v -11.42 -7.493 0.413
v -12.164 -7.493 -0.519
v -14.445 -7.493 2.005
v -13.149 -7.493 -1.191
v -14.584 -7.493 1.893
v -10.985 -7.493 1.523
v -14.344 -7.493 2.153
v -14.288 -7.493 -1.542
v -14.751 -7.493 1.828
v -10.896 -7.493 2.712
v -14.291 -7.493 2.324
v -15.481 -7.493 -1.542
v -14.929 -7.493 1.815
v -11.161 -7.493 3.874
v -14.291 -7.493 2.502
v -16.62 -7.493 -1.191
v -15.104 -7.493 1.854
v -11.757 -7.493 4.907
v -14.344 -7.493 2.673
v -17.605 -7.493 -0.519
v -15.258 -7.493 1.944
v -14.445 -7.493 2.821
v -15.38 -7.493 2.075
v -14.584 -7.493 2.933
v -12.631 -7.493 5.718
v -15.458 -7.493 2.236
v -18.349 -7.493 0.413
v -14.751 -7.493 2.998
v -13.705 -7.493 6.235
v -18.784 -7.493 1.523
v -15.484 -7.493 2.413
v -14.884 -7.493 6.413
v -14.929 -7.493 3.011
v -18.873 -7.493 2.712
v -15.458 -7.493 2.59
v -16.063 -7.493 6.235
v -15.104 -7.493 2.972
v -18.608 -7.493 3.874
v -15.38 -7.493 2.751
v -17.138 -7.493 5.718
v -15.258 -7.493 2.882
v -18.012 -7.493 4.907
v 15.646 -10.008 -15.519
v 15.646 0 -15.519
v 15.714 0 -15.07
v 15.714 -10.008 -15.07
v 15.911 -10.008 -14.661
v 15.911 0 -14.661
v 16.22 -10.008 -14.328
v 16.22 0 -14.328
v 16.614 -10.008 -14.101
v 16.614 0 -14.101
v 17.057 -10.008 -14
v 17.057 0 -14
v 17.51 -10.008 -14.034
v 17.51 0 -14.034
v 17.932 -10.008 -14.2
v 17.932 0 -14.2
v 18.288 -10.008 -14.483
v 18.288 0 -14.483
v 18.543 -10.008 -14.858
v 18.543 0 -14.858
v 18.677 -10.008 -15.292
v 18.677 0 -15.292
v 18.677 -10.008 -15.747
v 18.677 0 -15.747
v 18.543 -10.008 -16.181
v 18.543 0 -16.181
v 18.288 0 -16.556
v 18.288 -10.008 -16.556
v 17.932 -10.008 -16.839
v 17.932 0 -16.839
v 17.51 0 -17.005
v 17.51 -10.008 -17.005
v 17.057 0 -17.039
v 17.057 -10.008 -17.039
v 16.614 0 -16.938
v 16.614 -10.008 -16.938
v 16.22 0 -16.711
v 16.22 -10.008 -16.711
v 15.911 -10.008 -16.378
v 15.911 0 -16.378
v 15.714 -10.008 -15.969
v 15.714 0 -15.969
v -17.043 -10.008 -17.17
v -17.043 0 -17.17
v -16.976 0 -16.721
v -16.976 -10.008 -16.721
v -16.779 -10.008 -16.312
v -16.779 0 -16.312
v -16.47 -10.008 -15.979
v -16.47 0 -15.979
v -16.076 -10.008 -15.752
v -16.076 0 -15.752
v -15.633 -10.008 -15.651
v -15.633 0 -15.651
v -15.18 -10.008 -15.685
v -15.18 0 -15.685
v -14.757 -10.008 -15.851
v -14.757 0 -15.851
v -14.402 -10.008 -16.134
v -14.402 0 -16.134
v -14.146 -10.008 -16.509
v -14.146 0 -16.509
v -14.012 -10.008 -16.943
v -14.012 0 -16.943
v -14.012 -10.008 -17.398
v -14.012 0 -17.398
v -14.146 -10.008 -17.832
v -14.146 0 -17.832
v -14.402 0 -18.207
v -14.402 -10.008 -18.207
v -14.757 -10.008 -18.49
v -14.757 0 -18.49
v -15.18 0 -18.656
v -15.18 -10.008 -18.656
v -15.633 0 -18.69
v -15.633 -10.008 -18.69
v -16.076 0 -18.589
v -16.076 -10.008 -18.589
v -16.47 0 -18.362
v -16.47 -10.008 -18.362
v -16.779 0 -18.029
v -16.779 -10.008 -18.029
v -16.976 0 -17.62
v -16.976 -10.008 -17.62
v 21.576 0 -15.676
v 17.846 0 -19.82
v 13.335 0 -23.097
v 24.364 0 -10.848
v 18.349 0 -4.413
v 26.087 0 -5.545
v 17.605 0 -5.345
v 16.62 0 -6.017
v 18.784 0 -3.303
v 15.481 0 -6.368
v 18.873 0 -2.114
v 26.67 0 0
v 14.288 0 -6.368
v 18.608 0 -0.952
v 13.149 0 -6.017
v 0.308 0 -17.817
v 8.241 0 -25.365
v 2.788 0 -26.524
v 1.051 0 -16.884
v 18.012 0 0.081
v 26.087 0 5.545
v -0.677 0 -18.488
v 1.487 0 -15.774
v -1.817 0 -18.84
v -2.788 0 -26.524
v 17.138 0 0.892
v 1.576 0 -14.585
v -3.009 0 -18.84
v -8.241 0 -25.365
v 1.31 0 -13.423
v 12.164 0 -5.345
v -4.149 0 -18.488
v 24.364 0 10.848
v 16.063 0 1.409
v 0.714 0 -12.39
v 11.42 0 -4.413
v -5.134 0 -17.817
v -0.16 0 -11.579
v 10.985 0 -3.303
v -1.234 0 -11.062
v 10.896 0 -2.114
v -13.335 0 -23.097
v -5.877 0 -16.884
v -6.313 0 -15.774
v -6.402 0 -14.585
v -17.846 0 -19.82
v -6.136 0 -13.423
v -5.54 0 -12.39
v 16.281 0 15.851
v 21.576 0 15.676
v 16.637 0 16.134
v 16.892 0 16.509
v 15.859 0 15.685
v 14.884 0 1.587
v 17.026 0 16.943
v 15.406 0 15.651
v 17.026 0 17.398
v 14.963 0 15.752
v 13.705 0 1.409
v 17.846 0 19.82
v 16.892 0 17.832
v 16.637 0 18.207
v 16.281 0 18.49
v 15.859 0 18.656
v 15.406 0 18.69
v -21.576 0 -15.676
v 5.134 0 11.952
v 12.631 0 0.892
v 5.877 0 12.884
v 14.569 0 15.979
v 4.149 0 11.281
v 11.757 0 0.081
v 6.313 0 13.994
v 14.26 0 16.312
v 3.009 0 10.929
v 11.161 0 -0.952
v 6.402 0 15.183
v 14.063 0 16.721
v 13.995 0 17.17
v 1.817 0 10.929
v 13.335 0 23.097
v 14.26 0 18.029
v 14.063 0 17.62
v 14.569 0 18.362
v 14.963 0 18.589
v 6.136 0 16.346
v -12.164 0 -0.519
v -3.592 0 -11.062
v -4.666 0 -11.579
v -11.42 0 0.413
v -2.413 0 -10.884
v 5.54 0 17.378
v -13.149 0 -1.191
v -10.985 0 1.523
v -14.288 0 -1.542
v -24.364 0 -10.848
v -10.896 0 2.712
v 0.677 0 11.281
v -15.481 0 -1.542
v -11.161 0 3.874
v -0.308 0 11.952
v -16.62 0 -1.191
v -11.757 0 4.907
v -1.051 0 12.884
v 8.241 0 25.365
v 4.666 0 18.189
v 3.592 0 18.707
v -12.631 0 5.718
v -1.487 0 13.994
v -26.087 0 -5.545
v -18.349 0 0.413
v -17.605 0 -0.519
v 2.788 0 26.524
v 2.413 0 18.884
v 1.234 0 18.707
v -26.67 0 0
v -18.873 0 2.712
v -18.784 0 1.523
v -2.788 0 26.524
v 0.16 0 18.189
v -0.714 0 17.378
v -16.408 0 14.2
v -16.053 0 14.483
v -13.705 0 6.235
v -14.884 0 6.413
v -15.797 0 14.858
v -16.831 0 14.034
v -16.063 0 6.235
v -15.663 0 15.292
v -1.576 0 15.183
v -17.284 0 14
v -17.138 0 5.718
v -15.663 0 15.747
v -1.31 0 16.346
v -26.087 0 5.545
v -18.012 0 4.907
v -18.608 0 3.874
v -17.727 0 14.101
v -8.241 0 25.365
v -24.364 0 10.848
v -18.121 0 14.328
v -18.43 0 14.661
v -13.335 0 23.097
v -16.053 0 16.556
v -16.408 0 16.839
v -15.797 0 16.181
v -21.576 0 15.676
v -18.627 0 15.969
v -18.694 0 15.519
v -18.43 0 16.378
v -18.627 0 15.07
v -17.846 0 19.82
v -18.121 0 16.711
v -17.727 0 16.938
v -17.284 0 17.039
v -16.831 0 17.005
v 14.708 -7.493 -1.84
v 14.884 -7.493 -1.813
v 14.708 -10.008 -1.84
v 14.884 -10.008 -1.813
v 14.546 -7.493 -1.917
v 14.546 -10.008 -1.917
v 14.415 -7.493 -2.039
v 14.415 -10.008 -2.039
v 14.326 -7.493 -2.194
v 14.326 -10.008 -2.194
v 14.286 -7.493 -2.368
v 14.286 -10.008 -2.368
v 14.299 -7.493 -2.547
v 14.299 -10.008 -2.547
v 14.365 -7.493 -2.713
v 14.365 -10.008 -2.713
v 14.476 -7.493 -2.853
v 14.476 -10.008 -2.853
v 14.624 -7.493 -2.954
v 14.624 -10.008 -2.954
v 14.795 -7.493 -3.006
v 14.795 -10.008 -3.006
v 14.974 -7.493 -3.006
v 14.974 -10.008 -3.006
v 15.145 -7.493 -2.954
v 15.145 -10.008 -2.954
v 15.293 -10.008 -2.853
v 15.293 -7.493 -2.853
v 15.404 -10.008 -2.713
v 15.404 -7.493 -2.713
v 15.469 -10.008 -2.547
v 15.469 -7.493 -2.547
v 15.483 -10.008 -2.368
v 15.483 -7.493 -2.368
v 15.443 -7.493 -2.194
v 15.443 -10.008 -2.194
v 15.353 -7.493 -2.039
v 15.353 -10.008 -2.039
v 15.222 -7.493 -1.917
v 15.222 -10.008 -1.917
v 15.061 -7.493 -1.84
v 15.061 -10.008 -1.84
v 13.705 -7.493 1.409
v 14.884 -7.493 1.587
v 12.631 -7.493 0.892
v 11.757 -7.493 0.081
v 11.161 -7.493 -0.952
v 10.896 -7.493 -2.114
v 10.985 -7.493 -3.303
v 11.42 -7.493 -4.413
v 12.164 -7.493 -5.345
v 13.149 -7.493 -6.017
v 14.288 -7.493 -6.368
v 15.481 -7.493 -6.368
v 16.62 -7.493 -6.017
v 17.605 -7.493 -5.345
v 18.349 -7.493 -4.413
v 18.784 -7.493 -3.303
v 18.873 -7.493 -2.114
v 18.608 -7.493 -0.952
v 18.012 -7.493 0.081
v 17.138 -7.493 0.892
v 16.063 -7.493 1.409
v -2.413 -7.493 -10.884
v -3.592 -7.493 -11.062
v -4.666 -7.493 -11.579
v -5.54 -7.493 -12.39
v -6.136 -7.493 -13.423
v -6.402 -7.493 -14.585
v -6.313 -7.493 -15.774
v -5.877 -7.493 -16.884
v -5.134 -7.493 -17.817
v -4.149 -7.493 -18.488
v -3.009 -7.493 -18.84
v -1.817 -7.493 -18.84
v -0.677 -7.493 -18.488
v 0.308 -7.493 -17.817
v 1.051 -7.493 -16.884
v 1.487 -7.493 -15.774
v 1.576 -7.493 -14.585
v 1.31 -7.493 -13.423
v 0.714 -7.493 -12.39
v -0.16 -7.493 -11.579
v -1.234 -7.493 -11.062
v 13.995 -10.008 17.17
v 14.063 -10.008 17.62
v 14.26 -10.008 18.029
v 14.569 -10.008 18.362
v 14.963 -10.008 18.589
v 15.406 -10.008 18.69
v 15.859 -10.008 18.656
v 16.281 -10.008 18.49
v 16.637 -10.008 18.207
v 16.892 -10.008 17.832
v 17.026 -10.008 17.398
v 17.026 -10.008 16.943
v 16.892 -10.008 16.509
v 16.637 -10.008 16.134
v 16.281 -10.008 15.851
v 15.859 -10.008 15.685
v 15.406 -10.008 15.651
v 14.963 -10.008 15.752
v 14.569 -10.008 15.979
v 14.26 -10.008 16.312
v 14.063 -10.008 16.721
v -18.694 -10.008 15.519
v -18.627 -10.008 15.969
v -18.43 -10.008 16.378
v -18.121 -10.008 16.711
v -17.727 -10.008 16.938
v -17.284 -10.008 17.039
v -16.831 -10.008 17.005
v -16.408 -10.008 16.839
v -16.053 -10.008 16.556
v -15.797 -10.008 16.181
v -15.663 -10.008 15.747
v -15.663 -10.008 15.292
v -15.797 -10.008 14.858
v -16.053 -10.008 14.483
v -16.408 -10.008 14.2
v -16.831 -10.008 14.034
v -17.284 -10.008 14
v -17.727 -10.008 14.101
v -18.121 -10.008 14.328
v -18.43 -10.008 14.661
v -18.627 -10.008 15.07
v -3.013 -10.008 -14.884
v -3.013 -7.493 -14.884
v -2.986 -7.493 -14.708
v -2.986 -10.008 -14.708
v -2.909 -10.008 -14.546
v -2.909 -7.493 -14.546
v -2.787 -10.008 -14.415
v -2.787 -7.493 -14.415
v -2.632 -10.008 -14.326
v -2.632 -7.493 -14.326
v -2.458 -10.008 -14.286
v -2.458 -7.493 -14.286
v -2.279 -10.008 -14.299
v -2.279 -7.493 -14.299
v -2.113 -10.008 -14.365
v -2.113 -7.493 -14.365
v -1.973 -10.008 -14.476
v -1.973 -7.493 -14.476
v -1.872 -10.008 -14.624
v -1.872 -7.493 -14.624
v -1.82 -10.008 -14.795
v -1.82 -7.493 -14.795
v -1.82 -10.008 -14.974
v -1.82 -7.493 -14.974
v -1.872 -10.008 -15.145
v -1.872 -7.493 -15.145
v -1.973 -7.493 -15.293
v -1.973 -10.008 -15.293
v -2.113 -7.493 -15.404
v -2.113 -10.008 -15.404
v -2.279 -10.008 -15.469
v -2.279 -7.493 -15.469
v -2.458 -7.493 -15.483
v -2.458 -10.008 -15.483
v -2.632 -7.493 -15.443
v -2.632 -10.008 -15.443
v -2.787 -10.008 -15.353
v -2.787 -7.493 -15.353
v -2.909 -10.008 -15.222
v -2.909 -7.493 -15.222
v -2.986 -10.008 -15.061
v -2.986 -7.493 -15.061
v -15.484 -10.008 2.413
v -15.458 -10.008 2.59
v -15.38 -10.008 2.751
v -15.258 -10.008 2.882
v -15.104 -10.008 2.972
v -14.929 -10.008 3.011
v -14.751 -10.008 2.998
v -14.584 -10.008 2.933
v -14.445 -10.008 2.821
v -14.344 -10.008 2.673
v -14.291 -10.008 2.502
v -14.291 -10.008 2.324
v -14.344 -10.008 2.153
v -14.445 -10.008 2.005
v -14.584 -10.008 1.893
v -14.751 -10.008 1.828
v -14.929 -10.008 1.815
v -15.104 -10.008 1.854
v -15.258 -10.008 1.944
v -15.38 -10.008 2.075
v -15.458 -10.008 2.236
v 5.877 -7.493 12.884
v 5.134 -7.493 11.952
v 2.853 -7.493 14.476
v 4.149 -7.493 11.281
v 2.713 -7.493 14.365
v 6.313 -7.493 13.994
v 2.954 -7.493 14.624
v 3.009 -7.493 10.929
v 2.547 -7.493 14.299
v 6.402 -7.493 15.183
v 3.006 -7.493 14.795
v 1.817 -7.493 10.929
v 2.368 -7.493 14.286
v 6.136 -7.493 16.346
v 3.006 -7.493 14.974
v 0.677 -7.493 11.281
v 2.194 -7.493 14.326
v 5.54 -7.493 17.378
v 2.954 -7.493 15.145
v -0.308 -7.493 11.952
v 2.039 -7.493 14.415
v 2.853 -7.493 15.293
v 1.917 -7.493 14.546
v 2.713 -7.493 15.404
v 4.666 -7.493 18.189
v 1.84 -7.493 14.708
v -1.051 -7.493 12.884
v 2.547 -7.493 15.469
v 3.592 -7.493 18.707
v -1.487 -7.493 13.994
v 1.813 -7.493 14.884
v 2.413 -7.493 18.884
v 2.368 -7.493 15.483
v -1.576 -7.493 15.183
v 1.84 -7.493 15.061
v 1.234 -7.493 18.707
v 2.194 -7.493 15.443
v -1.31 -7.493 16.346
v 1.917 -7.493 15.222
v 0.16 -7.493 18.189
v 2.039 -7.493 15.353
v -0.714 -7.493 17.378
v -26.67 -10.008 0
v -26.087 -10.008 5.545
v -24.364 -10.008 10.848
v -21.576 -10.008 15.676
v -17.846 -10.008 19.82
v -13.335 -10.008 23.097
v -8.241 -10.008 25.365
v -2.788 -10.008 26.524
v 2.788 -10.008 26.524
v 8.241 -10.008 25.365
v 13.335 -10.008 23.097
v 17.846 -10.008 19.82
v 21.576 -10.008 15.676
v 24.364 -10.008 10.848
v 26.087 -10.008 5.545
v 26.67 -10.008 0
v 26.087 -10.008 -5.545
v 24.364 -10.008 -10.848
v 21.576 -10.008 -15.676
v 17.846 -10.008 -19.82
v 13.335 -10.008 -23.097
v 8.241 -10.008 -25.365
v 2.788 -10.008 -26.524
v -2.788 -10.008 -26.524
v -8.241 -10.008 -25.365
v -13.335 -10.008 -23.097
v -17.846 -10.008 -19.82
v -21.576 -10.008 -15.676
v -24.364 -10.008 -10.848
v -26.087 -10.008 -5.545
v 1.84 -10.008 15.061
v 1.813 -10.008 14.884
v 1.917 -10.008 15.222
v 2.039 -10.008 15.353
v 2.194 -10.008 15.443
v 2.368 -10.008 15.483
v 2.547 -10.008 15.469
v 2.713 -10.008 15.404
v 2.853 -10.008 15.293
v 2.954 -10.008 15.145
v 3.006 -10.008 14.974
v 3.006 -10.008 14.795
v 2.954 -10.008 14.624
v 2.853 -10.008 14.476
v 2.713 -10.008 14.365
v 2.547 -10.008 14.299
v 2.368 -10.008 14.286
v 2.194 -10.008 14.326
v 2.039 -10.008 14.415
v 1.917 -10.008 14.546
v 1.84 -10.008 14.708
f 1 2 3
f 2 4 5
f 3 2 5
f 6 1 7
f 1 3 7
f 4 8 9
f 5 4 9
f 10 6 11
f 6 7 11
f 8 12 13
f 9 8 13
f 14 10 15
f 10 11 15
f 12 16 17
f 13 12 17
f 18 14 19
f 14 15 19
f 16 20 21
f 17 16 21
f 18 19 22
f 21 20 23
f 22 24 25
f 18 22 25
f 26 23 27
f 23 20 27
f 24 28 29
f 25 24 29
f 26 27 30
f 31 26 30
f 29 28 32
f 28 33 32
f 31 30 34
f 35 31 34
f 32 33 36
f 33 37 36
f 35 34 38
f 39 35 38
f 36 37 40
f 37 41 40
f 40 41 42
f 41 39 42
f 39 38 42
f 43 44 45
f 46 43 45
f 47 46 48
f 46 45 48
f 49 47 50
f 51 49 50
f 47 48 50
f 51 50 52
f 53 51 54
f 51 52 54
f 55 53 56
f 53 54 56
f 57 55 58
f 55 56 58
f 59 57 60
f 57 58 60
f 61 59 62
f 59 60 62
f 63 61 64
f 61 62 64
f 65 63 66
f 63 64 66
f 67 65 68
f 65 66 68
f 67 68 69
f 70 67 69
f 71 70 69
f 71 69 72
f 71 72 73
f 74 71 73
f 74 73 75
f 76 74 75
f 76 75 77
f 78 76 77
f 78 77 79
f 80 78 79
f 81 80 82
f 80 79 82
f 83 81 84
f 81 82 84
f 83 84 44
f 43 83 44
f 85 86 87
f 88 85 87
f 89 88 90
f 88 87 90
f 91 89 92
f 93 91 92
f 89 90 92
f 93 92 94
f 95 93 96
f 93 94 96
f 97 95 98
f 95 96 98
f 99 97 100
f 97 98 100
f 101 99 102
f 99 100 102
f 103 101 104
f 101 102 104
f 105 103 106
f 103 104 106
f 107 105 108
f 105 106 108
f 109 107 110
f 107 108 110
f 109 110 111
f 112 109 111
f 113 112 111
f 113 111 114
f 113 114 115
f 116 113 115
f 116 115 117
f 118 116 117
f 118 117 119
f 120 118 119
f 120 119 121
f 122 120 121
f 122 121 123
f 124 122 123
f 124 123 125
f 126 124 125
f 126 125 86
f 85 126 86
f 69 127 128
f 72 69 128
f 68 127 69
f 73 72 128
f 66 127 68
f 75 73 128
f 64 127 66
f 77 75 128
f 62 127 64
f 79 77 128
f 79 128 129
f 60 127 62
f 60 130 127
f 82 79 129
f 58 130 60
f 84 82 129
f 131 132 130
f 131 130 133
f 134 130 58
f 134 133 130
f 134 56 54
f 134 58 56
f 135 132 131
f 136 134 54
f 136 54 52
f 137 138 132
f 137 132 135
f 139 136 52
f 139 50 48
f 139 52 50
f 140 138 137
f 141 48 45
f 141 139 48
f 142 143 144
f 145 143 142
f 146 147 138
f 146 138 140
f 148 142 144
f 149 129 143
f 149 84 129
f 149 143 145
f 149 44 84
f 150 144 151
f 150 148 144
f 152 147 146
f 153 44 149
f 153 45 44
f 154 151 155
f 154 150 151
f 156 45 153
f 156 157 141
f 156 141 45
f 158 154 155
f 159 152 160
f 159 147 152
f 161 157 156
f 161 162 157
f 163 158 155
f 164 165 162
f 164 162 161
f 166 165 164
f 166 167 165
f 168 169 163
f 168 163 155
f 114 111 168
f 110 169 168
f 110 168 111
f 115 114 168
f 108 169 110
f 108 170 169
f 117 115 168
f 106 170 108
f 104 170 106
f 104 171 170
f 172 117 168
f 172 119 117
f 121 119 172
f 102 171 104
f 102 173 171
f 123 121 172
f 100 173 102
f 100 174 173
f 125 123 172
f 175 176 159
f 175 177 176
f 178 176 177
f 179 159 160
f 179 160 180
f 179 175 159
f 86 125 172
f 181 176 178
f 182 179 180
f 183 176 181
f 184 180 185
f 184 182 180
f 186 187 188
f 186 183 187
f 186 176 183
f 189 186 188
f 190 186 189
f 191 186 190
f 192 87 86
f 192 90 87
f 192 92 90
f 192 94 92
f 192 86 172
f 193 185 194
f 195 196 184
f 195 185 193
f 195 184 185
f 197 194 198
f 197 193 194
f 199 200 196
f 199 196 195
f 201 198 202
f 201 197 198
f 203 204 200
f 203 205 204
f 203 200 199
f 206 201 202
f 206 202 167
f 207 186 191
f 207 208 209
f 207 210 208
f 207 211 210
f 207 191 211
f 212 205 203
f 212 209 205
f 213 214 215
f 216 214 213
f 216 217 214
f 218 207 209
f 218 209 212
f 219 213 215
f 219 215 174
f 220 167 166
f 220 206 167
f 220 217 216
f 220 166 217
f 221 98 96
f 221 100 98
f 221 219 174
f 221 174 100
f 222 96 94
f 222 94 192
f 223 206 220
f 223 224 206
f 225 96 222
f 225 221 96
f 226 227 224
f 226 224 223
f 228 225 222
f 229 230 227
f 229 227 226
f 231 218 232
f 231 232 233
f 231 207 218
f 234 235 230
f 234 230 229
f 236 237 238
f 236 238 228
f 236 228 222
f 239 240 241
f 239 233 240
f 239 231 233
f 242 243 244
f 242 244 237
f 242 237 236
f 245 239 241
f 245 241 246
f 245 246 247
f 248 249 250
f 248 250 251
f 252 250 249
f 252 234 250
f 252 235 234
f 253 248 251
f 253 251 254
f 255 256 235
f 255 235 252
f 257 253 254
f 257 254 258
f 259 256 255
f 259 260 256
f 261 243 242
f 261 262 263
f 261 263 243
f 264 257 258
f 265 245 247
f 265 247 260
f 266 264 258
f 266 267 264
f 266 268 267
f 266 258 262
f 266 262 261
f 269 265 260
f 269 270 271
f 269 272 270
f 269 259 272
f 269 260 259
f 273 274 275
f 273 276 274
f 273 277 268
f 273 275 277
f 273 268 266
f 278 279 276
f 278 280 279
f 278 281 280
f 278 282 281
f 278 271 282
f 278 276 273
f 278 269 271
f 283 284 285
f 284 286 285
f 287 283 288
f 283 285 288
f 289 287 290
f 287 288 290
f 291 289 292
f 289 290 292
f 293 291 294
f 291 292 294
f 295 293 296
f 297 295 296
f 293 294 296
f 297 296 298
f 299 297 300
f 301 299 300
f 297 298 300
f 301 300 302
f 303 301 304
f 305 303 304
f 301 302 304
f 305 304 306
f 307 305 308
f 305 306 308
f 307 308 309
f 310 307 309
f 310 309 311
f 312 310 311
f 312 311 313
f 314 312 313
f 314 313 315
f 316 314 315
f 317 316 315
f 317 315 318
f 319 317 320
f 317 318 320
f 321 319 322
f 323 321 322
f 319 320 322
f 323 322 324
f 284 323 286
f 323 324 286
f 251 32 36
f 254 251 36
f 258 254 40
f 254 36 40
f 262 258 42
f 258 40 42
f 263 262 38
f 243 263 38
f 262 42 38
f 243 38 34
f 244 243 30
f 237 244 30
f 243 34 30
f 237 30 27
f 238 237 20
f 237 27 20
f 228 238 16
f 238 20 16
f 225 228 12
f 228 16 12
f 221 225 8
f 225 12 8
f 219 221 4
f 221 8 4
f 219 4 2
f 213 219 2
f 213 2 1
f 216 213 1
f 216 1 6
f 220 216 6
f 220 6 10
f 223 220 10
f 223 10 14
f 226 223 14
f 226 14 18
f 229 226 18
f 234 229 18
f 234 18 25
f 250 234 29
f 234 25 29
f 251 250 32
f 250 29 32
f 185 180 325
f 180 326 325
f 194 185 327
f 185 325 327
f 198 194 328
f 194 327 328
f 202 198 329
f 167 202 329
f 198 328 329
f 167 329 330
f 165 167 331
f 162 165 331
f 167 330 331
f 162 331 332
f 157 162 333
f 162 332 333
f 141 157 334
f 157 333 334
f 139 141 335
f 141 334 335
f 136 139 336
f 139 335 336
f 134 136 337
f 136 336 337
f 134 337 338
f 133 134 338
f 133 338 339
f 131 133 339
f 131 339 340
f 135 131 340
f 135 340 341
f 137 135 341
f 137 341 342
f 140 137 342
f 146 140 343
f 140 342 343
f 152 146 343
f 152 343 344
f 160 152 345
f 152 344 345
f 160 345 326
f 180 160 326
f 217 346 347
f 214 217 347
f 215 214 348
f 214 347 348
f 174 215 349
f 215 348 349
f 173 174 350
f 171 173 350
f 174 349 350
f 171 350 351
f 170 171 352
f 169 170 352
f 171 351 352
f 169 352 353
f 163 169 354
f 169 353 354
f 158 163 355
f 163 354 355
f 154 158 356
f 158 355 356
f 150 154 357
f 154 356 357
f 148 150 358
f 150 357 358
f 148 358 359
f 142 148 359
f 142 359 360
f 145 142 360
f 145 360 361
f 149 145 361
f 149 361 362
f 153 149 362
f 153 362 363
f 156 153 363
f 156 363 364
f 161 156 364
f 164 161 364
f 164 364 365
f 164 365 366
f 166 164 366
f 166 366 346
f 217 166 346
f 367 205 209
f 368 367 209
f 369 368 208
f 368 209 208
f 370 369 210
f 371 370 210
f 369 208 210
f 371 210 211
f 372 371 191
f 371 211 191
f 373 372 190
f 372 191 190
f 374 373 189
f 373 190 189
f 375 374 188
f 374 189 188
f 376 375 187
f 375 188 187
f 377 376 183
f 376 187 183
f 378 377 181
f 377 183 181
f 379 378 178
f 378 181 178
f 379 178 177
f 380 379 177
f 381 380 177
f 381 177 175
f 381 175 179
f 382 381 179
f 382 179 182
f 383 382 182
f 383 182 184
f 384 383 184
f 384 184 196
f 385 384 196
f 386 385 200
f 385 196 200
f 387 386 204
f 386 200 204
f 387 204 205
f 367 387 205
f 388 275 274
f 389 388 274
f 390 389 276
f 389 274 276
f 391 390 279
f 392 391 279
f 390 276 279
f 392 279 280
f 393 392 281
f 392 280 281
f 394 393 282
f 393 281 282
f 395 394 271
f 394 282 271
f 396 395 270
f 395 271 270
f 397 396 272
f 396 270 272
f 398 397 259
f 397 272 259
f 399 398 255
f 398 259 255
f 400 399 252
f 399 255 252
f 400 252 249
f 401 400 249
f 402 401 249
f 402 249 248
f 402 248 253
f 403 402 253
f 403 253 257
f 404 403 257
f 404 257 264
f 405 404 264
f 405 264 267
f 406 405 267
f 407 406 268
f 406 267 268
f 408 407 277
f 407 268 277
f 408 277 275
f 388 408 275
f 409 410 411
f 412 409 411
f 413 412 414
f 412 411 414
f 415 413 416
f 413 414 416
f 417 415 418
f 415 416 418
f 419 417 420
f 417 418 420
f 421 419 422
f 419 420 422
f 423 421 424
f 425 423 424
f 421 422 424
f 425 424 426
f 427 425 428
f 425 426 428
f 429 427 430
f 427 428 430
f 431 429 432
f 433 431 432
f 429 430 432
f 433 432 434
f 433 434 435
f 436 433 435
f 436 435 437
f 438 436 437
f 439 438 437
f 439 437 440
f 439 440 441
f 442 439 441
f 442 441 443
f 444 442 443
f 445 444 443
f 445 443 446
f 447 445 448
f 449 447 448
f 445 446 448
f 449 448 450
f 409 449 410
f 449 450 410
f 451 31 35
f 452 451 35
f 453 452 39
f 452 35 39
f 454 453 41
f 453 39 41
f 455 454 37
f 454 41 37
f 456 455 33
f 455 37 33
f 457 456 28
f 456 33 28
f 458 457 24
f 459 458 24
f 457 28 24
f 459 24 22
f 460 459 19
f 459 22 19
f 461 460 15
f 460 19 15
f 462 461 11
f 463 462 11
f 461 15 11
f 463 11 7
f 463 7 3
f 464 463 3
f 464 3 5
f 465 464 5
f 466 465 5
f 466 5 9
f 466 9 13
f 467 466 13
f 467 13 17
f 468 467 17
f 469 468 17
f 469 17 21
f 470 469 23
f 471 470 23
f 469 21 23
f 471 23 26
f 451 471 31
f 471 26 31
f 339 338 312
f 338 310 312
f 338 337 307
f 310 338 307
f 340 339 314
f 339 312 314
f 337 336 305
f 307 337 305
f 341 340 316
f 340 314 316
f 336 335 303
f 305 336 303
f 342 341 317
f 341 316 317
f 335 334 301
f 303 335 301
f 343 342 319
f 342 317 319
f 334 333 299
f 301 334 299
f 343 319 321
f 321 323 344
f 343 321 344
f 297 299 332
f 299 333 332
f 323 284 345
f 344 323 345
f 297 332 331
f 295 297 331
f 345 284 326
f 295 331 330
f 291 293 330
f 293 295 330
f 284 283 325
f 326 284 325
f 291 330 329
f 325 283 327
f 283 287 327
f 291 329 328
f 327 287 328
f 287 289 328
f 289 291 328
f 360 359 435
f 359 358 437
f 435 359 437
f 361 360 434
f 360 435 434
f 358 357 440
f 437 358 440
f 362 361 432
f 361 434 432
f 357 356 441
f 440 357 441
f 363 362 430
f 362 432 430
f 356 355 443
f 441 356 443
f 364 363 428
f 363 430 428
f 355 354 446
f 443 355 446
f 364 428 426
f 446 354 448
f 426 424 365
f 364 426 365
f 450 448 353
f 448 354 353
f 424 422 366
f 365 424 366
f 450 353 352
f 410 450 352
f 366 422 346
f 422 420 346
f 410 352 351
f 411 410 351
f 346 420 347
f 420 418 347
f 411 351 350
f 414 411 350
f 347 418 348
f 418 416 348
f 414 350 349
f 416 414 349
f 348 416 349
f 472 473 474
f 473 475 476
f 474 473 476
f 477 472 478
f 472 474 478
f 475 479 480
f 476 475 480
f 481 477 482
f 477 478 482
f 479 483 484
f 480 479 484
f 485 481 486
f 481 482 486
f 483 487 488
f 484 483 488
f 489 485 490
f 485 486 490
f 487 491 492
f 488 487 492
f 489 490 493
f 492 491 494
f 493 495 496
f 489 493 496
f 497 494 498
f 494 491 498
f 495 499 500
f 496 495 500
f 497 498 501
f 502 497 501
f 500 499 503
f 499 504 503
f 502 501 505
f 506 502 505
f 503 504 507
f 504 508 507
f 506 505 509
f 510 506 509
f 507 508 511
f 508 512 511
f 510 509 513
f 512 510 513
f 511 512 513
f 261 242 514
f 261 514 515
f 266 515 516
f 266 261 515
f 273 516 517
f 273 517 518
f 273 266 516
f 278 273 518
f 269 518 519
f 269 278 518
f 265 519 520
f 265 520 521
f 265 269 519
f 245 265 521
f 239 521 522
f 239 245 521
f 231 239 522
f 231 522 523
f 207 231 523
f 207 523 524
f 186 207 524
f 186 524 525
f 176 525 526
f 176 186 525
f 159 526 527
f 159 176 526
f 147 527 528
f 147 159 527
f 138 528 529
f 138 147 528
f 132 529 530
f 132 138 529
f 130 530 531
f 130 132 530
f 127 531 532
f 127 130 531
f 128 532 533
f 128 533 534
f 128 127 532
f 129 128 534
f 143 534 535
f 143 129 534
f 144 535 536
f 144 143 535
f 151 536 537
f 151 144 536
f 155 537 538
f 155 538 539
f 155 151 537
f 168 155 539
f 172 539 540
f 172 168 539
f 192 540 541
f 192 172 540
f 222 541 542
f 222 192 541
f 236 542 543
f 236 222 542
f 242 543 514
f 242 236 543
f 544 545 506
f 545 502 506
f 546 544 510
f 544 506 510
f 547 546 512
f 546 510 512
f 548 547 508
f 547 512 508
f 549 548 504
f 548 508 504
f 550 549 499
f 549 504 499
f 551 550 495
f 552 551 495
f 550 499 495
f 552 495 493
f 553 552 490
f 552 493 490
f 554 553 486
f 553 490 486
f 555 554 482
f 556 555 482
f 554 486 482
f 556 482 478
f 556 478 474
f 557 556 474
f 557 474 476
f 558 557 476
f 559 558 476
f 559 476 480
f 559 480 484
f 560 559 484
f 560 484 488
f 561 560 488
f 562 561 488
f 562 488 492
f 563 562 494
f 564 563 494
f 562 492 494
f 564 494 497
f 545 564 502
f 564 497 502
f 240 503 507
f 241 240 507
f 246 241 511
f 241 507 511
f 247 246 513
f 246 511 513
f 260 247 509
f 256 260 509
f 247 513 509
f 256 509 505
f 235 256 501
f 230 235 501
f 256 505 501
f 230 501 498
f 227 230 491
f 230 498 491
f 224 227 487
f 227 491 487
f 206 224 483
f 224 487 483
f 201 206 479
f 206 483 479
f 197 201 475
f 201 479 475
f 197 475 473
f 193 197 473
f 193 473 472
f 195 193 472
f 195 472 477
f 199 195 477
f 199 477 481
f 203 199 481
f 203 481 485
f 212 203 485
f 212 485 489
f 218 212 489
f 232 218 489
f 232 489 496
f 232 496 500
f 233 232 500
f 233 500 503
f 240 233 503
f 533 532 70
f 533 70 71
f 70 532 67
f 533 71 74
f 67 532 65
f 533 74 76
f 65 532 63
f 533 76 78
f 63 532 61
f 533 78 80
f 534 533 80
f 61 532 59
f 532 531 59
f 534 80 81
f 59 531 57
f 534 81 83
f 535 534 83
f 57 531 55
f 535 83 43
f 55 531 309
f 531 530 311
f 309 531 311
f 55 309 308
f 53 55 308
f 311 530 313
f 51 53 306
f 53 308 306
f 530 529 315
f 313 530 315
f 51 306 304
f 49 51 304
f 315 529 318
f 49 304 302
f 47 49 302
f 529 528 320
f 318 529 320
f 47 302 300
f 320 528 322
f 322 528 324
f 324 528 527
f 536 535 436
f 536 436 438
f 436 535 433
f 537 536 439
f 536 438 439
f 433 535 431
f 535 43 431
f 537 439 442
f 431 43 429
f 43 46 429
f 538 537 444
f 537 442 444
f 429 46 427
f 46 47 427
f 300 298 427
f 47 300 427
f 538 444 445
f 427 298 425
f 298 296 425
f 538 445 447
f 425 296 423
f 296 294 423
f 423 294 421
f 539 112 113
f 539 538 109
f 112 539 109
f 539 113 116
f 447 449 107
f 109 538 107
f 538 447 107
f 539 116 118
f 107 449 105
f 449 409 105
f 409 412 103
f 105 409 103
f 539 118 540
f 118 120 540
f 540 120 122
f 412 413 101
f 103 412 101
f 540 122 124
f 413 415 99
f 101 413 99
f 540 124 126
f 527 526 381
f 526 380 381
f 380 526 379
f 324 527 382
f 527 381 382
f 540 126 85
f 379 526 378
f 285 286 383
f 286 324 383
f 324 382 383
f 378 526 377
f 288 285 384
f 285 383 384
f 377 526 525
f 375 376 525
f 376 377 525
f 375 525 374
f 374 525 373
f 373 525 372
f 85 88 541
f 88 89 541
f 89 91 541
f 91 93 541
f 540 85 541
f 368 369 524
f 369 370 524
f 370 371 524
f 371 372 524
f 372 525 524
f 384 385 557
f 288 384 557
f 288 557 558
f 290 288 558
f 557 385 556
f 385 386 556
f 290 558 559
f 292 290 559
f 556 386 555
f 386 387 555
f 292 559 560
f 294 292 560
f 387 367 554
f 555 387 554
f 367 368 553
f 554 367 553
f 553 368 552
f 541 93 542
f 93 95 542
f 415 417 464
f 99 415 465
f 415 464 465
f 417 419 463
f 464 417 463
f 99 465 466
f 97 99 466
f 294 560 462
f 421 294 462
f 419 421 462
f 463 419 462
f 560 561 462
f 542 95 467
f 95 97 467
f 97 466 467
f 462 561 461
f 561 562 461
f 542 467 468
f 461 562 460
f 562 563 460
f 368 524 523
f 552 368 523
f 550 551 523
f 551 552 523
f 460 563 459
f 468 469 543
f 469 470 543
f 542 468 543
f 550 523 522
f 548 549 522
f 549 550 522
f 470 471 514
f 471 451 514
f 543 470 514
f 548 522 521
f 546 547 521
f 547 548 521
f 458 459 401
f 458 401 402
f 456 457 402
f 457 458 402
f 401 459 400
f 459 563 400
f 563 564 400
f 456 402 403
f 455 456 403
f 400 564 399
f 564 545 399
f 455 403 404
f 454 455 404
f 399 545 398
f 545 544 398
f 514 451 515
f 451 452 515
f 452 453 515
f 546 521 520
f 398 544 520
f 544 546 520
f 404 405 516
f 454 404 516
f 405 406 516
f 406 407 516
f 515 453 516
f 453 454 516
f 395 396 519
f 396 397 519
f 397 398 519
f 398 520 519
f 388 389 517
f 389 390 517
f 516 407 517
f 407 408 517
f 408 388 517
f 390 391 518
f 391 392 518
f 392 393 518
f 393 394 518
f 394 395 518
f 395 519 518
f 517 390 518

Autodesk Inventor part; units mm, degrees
ref_plane "YZ Plane" through (0, 0, 0) normal (1, 0, 0) x (0, 1, 0)
ref_plane "XZ Plane" through (0, 0, 0) normal (0, 1, 0) x (-1, 0, 0)
ref_plane "XY Plane" through (0, 0, 0) normal (0, 0, 1) x (1, 0, 0)
sketch "Sketch1" plane through (0, 0, 0) normal (0, 1, 0) x (-1, 0, 0)
  circle A0 centre (0, 0) radius 26.67
  circle A1 centre (2.413, -14.8844) radius 0.6
  circle A2 centre (2.413, -14.8844) radius 4.0005
  circle A3 centre (14.8844, 2.413) radius 4.0005
  circle A4 centre (14.8844, 2.413) radius 0.6
  circle A5 centre (-2.413, 14.8844) radius 4.0005
  circle A6 centre (-2.413, 14.8844) radius 0.6
  circle A7 centre (-14.8844, -2.413) radius 4.0005
  circle A8 centre (-14.8844, -2.413) radius 0.6
  circle A9 centre (15.5194, -17.1704) radius 1.524
  circle A10 centre (17.1704, 15.5194) radius 1.524
  circle A11 centre (-15.5194, 17.1704) radius 1.524
  circle A12 centre (-17.1704, -15.5194) radius 1.524
  dimension "d0" = 53.34
  dimension "d7" = 360
  dimension "d14" = 360
extrude "Extrusion1" add sketch "Sketch1" against normal blind 10.0076 contours A0 | A2 | A3 | A5 | A7 | A8
hole "Hole1" at (-14.8844, 0, 2.413) direction (0, -1, 0) diameter 8 depth 7.493
hole "Hole2" at (-2.413, 0, -14.8844) at (2.413, 0, 14.8844) at (14.8844, 0, -2.413) direction (0, -1, 0) diameter 8 depth 7.493
hole "Hole3" at (14.8844, 0, -2.413) direction (0, -1, 0) diameter 1.2 end through all
thread "Thread1" size "M3x0.5" class "6H" standard "ANSI Metric M Profile" length 10
thread "Thread2" size "M3x0.5" class "6H" standard "ANSI Metric M Profile" length 10
thread "Thread3" size "M3x0.5" class "6H" standard "ANSI Metric M Profile" length 10
thread "Thread4" size "M3x0.5" class "6H" standard "ANSI Metric M Profile" length 10
thread "Thread5" size "M8x1.25" class "6H" standard "ANSI Metric M Profile" length 10
thread "Thread6" size "M8x1.25" class "6H" standard "ANSI Metric M Profile" length 10
thread "Thread7" size "M8x1.25" class "6H" standard "ANSI Metric M Profile" length 10
thread "Thread8" size "M8x1.25" class "6H" standard "ANSI Metric M Profile" length 10
